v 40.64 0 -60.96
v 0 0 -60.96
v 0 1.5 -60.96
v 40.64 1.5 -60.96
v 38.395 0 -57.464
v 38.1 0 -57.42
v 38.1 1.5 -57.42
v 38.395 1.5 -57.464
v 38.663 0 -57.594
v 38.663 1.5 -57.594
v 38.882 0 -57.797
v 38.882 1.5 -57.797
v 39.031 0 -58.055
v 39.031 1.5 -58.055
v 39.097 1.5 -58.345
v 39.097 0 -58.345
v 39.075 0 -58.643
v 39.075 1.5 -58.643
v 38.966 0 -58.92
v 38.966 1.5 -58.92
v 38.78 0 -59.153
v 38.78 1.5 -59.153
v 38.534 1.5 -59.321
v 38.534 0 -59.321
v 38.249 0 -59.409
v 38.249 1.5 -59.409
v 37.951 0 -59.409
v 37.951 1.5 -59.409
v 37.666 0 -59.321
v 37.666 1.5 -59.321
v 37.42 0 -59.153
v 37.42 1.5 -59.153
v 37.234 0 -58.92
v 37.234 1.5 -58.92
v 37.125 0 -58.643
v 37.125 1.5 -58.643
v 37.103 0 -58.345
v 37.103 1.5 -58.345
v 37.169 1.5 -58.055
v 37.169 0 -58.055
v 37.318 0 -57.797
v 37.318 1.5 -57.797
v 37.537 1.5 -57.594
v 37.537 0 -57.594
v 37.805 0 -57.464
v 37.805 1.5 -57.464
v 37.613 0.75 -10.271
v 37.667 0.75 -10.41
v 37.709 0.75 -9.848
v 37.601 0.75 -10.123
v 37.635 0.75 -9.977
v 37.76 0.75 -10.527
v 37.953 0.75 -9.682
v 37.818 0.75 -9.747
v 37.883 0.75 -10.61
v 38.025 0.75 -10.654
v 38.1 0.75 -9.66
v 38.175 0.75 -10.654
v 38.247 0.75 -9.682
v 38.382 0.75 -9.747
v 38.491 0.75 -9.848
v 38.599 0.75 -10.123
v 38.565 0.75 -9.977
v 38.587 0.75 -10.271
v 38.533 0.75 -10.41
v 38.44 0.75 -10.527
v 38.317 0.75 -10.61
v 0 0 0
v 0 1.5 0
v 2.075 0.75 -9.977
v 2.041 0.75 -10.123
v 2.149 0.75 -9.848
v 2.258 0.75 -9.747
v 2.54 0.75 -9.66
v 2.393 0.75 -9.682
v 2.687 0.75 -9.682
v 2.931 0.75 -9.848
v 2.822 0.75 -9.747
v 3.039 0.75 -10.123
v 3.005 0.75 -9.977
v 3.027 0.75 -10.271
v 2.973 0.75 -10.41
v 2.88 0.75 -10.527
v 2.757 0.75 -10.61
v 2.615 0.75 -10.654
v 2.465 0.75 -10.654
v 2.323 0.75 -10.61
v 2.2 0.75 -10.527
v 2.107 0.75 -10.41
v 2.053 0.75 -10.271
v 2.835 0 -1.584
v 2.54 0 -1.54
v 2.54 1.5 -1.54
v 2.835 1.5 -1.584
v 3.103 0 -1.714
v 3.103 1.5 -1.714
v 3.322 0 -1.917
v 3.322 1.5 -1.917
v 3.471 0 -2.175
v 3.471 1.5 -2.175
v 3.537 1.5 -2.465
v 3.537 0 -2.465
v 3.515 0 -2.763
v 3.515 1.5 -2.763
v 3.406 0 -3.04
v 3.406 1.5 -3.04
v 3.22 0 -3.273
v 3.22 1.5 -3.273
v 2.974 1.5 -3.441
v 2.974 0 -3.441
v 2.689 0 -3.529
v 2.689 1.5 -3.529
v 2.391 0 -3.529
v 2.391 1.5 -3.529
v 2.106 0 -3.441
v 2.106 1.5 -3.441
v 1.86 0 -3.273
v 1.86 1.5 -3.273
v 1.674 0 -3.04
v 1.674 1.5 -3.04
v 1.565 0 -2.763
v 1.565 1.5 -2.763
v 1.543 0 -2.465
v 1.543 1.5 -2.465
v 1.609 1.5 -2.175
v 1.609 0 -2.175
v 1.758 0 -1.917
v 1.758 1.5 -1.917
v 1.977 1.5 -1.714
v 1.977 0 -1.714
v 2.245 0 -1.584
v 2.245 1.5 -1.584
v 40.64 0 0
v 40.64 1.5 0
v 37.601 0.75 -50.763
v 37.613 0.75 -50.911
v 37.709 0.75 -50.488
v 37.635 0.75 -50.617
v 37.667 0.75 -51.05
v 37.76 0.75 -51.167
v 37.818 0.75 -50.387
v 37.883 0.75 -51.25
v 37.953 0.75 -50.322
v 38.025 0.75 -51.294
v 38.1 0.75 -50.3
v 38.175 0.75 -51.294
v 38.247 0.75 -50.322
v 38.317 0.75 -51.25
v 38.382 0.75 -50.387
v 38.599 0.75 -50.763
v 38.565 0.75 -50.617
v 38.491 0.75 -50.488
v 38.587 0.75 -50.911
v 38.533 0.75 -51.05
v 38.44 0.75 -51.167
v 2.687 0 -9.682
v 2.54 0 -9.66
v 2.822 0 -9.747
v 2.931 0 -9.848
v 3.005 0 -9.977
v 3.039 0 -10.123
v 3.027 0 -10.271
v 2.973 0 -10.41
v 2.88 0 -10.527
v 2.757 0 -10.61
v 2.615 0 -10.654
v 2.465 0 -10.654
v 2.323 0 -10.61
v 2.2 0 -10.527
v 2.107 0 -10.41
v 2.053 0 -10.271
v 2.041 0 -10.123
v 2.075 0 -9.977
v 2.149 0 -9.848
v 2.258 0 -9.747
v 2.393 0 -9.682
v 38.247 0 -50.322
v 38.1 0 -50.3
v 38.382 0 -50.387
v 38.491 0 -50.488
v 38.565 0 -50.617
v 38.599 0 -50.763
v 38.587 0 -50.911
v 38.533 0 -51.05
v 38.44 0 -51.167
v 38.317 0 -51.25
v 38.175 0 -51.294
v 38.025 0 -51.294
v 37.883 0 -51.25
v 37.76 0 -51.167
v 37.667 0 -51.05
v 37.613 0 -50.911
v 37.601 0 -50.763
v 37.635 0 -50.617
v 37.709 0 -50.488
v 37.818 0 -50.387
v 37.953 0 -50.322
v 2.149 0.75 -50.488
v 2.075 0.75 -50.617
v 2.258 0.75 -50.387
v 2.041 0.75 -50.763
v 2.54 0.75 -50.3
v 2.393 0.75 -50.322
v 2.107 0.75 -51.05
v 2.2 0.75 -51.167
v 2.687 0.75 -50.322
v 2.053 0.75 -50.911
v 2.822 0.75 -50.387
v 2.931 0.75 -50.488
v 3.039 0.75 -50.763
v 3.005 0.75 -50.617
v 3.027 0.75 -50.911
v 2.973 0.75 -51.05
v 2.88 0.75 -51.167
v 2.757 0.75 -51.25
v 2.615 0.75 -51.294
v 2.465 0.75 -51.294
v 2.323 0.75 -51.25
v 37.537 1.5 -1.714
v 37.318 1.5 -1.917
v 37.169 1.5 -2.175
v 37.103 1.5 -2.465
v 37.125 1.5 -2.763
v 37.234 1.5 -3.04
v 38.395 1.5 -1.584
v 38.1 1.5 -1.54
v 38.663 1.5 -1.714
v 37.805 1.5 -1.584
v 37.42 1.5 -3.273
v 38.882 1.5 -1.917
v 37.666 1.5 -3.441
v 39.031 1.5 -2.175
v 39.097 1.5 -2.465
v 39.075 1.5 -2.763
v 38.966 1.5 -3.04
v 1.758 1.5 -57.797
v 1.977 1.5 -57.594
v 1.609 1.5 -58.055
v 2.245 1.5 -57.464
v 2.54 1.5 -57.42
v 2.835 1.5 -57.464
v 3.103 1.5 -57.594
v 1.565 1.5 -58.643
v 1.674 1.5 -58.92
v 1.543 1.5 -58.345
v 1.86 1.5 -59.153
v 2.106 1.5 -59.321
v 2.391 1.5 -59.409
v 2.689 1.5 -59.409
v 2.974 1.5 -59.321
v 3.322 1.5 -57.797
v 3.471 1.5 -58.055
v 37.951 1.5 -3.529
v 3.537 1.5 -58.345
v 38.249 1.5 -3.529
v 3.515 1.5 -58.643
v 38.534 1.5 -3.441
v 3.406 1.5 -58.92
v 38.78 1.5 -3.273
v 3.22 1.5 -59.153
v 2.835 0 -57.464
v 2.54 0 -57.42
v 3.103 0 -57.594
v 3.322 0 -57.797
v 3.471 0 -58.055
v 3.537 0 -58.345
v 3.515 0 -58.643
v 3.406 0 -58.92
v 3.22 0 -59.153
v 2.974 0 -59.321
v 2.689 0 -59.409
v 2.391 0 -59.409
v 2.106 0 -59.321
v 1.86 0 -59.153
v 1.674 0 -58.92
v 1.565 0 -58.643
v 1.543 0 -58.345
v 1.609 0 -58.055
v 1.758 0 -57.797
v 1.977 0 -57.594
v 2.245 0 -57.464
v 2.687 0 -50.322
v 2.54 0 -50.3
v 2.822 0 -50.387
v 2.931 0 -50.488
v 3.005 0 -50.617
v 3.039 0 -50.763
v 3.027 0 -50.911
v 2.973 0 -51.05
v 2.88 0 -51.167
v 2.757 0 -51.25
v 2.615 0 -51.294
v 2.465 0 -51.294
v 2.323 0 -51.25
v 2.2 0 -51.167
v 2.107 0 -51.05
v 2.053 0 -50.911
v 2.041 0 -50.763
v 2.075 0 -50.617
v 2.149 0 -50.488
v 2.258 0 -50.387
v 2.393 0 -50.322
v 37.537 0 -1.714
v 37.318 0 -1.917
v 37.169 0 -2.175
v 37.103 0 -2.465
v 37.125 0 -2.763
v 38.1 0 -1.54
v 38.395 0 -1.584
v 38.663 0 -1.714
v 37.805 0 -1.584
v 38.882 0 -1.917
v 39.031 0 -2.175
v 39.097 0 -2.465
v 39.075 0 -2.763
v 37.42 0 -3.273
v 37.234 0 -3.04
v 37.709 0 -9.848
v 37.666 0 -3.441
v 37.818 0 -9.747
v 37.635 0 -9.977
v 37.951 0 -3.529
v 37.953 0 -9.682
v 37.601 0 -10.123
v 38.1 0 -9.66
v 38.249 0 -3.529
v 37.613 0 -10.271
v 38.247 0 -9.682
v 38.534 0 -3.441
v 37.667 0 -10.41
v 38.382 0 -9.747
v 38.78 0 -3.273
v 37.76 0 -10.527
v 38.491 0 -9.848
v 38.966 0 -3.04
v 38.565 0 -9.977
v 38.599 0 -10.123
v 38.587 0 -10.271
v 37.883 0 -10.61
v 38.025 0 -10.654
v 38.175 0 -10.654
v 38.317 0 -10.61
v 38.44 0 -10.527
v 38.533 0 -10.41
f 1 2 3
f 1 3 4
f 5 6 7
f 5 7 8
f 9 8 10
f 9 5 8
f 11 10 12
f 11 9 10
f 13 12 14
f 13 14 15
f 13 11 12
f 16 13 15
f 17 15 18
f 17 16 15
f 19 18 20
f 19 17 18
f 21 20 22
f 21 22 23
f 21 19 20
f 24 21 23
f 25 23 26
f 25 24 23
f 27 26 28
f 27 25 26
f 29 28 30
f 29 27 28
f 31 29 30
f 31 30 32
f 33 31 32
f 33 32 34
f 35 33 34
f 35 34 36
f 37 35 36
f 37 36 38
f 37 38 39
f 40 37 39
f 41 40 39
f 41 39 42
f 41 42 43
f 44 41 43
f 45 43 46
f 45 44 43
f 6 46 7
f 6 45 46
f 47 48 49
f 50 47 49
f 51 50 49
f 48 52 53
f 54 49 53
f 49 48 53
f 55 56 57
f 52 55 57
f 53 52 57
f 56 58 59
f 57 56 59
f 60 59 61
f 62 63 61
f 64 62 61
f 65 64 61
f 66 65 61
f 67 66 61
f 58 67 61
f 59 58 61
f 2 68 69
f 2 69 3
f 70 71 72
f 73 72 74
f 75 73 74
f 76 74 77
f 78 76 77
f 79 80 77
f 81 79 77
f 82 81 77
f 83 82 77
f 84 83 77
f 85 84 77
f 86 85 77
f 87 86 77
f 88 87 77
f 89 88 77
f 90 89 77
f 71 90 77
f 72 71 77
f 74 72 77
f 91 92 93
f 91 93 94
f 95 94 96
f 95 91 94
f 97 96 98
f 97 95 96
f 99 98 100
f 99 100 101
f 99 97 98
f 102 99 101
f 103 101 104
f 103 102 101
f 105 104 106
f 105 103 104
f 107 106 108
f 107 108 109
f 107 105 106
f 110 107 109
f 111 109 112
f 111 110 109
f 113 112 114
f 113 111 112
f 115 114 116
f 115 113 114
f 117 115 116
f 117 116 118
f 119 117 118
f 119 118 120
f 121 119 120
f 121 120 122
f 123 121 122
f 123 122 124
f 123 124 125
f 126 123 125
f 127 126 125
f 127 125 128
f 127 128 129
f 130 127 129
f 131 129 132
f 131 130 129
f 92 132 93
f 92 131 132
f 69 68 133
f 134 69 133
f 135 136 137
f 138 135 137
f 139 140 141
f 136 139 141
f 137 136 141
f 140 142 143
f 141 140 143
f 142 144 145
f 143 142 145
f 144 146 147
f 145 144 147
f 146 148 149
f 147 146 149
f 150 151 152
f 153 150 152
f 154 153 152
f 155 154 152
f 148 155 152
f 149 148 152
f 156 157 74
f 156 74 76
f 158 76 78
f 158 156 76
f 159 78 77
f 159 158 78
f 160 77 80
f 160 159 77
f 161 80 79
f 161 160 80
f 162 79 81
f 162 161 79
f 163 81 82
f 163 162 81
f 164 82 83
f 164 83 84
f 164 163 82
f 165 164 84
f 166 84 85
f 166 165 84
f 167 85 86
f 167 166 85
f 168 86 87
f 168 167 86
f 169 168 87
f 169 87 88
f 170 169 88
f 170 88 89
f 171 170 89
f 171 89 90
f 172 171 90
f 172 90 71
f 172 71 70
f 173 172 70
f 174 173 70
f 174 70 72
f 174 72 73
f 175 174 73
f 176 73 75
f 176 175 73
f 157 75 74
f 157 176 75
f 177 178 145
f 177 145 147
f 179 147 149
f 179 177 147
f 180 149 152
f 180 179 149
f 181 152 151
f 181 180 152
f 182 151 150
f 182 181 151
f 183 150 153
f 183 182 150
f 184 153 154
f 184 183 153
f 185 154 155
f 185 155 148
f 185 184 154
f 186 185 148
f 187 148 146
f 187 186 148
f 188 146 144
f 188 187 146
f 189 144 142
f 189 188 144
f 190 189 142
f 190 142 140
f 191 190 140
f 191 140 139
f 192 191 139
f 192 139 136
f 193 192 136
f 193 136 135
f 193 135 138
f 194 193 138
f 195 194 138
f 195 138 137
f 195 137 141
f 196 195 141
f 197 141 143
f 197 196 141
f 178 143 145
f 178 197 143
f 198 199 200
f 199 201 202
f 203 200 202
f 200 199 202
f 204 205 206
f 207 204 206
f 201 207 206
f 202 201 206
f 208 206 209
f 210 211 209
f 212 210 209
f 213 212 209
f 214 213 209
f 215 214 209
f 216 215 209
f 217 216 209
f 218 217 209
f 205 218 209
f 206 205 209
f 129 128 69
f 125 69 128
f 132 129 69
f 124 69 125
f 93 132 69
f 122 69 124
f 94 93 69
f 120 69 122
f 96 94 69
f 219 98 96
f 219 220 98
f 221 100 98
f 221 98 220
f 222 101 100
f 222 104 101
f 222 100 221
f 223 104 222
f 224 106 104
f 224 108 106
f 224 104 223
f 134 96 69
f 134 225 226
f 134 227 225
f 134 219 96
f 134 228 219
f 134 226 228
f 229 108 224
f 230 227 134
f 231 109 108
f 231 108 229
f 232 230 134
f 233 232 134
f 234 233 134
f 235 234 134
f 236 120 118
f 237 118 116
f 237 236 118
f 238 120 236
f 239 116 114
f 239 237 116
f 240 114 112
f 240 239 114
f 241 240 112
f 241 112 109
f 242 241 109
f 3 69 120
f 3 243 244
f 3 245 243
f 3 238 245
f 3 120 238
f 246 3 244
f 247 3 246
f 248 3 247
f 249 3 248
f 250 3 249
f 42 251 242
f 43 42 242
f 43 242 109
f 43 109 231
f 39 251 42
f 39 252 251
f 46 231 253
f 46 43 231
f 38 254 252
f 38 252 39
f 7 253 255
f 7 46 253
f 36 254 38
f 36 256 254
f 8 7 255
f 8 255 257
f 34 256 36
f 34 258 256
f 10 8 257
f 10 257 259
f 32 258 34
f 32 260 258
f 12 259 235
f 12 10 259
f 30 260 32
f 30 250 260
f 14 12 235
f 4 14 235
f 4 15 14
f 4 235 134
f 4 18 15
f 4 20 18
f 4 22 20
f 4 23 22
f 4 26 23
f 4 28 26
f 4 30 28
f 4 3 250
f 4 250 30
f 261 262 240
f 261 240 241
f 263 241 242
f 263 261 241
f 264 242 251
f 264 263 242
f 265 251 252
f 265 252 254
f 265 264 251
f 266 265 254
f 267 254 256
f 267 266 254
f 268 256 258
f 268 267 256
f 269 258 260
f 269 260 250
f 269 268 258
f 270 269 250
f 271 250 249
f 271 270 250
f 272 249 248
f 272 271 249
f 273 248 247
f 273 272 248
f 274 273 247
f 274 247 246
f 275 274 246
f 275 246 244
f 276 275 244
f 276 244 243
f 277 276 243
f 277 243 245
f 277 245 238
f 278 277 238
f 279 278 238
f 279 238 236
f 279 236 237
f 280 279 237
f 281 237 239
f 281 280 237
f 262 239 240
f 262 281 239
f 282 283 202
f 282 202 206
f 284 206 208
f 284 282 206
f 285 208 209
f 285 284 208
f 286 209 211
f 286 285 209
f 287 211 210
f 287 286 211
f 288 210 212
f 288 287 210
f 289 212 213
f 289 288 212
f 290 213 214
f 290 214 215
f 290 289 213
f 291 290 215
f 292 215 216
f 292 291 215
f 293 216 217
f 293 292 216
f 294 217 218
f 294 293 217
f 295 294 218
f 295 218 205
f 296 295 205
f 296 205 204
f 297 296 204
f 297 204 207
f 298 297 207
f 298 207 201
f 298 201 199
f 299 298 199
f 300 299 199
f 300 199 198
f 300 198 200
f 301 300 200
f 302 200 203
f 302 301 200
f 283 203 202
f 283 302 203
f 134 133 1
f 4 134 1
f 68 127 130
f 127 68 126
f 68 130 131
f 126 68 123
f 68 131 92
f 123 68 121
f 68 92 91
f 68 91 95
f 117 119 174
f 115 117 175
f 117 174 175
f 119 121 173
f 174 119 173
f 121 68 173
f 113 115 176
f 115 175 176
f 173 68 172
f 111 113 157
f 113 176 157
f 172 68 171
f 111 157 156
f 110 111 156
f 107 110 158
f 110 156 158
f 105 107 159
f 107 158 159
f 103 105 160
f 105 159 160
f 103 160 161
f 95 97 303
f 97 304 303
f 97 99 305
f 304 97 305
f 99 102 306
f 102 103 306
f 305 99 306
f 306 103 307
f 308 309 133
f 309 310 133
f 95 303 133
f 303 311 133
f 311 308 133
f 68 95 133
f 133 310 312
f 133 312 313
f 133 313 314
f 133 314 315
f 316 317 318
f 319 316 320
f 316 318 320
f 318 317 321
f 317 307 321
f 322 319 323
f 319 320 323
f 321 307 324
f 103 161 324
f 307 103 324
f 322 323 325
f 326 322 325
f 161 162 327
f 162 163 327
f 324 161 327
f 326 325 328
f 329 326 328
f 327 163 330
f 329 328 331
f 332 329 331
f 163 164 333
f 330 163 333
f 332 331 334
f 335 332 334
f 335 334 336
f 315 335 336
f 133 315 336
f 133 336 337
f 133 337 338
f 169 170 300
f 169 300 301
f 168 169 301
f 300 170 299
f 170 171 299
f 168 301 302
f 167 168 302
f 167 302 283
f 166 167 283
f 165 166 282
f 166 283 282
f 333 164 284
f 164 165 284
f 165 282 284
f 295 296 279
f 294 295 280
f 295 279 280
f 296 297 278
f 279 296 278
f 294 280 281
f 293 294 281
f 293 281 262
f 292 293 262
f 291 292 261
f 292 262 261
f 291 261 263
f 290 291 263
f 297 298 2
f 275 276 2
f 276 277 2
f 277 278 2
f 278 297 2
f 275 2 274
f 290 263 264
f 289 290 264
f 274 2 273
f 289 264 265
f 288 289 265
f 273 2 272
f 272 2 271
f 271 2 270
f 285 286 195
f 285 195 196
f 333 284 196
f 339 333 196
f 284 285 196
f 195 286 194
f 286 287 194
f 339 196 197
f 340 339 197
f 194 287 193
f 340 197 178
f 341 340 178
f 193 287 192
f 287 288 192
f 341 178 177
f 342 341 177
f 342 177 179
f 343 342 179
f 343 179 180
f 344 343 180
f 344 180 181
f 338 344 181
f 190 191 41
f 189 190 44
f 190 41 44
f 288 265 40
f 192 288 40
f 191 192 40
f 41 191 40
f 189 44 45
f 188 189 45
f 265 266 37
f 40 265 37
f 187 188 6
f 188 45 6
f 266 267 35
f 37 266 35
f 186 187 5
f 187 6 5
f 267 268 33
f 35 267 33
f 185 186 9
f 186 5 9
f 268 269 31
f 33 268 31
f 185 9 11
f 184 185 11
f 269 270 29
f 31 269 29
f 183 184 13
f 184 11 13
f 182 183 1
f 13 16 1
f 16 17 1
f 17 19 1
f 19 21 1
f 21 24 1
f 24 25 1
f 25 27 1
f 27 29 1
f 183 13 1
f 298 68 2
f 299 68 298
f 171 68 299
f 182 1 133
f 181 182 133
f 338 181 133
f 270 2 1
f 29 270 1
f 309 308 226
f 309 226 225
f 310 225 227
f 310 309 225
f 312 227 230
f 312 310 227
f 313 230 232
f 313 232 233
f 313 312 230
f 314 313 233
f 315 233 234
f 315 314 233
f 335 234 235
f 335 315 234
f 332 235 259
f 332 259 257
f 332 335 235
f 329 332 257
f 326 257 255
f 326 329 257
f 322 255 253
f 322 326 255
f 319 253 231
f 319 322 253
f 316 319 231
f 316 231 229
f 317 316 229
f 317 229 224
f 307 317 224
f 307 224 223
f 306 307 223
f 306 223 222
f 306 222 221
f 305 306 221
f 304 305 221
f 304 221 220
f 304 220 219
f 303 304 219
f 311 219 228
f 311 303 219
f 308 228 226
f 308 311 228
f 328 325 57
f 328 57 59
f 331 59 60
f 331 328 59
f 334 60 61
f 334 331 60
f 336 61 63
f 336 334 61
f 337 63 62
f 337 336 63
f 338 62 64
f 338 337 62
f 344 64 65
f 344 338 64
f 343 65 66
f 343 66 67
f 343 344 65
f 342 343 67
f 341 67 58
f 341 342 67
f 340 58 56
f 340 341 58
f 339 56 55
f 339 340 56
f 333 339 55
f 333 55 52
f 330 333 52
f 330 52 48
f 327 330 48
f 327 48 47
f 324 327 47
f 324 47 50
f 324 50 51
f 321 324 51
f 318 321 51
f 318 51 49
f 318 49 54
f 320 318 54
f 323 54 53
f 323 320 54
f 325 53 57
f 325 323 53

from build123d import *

# Parameters (mm, degrees)
SKETCH1_W           = 40.64
SKETCH1_H           = 60.96
SKETCH1_R           = 1
SKETCH1_R_2         = 0.5
BOSS_EXTRUDE1_DEPTH = 1.5
SKETCH1_5_R         = 0.5
CUT_EXTRUDE1_DEPTH  = 0.75


with BuildPart() as part:
    # Sketch1 → Boss-Extrude1 (new body)
    with BuildSketch(Plane(origin=(0, 0, 0), x_dir=(1, 0, 0), z_dir=(0, 1, 0))):
        with Locations((20.32, 30.48)):
            Rectangle(SKETCH1_W, SKETCH1_H)
        with Locations(Location((38.1, 58.42, 0), (0, 0, 270))):  # turned: the seam where the file's is
            Circle(SKETCH1_R, mode=Mode.SUBTRACT)
        with Locations((38.1, 50.8)):
            Circle(SKETCH1_R_2, mode=Mode.SUBTRACT)
        with Locations(Location((38.1, 2.54, 0), (0, 0, 270))):  # turned: the seam where the file's is
            Circle(SKETCH1_R, mode=Mode.SUBTRACT)
        with Locations(Location((2.54, 58.42, 0), (0, 0, 270))):  # turned: the seam where the file's is
            Circle(SKETCH1_R, mode=Mode.SUBTRACT)
        with Locations((2.54, 10.16)):
            Circle(SKETCH1_R_2, mode=Mode.SUBTRACT)
        with Locations(Location((2.54, 2.54, 0), (0, 0, 270))):  # turned: the seam where the file's is
            Circle(SKETCH1_R, mode=Mode.SUBTRACT)
        with Locations((2.54, 50.8)):
            Circle(SKETCH1_R_2, mode=Mode.SUBTRACT)
        with Locations((38.1, 10.16)):
            Circle(SKETCH1_R_2, mode=Mode.SUBTRACT)
        with Locations((2.54, 10.16)):
            Circle(SKETCH1_R_2)
        with Locations((38.1, 10.16)):
            Circle(SKETCH1_R_2)
        with Locations((38.1, 50.8)):
            Circle(SKETCH1_R_2)
        with Locations((2.54, 50.8)):
            Circle(SKETCH1_R_2)
    extrude(amount=BOSS_EXTRUDE1_DEPTH)

    # Sketch1_5 → Cut-Extrude1 (cut)
    with BuildSketch(Plane(origin=(0, 0, 0), x_dir=(1, 0, 0), z_dir=(0, 1, 0))):
        with Locations(Location((2.54, 50.8, 0), (0, 0, 270))):  # turned: the seam where the file's is
            Circle(SKETCH1_5_R)
        with Locations(Location((38.1, 50.8, 0), (0, 0, 270))):  # turned: the seam where the file's is
            Circle(SKETCH1_5_R)
        with Locations(Location((38.1, 10.16, 0), (0, 0, 270))):  # turned: the seam where the file's is
            Circle(SKETCH1_5_R)
        with Locations(Location((2.54, 10.16, 0), (0, 0, 270))):  # turned: the seam where the file's is
            Circle(SKETCH1_5_R)
    extrude(amount=CUT_EXTRUDE1_DEPTH, mode=Mode.SUBTRACT)


solid = part.part
